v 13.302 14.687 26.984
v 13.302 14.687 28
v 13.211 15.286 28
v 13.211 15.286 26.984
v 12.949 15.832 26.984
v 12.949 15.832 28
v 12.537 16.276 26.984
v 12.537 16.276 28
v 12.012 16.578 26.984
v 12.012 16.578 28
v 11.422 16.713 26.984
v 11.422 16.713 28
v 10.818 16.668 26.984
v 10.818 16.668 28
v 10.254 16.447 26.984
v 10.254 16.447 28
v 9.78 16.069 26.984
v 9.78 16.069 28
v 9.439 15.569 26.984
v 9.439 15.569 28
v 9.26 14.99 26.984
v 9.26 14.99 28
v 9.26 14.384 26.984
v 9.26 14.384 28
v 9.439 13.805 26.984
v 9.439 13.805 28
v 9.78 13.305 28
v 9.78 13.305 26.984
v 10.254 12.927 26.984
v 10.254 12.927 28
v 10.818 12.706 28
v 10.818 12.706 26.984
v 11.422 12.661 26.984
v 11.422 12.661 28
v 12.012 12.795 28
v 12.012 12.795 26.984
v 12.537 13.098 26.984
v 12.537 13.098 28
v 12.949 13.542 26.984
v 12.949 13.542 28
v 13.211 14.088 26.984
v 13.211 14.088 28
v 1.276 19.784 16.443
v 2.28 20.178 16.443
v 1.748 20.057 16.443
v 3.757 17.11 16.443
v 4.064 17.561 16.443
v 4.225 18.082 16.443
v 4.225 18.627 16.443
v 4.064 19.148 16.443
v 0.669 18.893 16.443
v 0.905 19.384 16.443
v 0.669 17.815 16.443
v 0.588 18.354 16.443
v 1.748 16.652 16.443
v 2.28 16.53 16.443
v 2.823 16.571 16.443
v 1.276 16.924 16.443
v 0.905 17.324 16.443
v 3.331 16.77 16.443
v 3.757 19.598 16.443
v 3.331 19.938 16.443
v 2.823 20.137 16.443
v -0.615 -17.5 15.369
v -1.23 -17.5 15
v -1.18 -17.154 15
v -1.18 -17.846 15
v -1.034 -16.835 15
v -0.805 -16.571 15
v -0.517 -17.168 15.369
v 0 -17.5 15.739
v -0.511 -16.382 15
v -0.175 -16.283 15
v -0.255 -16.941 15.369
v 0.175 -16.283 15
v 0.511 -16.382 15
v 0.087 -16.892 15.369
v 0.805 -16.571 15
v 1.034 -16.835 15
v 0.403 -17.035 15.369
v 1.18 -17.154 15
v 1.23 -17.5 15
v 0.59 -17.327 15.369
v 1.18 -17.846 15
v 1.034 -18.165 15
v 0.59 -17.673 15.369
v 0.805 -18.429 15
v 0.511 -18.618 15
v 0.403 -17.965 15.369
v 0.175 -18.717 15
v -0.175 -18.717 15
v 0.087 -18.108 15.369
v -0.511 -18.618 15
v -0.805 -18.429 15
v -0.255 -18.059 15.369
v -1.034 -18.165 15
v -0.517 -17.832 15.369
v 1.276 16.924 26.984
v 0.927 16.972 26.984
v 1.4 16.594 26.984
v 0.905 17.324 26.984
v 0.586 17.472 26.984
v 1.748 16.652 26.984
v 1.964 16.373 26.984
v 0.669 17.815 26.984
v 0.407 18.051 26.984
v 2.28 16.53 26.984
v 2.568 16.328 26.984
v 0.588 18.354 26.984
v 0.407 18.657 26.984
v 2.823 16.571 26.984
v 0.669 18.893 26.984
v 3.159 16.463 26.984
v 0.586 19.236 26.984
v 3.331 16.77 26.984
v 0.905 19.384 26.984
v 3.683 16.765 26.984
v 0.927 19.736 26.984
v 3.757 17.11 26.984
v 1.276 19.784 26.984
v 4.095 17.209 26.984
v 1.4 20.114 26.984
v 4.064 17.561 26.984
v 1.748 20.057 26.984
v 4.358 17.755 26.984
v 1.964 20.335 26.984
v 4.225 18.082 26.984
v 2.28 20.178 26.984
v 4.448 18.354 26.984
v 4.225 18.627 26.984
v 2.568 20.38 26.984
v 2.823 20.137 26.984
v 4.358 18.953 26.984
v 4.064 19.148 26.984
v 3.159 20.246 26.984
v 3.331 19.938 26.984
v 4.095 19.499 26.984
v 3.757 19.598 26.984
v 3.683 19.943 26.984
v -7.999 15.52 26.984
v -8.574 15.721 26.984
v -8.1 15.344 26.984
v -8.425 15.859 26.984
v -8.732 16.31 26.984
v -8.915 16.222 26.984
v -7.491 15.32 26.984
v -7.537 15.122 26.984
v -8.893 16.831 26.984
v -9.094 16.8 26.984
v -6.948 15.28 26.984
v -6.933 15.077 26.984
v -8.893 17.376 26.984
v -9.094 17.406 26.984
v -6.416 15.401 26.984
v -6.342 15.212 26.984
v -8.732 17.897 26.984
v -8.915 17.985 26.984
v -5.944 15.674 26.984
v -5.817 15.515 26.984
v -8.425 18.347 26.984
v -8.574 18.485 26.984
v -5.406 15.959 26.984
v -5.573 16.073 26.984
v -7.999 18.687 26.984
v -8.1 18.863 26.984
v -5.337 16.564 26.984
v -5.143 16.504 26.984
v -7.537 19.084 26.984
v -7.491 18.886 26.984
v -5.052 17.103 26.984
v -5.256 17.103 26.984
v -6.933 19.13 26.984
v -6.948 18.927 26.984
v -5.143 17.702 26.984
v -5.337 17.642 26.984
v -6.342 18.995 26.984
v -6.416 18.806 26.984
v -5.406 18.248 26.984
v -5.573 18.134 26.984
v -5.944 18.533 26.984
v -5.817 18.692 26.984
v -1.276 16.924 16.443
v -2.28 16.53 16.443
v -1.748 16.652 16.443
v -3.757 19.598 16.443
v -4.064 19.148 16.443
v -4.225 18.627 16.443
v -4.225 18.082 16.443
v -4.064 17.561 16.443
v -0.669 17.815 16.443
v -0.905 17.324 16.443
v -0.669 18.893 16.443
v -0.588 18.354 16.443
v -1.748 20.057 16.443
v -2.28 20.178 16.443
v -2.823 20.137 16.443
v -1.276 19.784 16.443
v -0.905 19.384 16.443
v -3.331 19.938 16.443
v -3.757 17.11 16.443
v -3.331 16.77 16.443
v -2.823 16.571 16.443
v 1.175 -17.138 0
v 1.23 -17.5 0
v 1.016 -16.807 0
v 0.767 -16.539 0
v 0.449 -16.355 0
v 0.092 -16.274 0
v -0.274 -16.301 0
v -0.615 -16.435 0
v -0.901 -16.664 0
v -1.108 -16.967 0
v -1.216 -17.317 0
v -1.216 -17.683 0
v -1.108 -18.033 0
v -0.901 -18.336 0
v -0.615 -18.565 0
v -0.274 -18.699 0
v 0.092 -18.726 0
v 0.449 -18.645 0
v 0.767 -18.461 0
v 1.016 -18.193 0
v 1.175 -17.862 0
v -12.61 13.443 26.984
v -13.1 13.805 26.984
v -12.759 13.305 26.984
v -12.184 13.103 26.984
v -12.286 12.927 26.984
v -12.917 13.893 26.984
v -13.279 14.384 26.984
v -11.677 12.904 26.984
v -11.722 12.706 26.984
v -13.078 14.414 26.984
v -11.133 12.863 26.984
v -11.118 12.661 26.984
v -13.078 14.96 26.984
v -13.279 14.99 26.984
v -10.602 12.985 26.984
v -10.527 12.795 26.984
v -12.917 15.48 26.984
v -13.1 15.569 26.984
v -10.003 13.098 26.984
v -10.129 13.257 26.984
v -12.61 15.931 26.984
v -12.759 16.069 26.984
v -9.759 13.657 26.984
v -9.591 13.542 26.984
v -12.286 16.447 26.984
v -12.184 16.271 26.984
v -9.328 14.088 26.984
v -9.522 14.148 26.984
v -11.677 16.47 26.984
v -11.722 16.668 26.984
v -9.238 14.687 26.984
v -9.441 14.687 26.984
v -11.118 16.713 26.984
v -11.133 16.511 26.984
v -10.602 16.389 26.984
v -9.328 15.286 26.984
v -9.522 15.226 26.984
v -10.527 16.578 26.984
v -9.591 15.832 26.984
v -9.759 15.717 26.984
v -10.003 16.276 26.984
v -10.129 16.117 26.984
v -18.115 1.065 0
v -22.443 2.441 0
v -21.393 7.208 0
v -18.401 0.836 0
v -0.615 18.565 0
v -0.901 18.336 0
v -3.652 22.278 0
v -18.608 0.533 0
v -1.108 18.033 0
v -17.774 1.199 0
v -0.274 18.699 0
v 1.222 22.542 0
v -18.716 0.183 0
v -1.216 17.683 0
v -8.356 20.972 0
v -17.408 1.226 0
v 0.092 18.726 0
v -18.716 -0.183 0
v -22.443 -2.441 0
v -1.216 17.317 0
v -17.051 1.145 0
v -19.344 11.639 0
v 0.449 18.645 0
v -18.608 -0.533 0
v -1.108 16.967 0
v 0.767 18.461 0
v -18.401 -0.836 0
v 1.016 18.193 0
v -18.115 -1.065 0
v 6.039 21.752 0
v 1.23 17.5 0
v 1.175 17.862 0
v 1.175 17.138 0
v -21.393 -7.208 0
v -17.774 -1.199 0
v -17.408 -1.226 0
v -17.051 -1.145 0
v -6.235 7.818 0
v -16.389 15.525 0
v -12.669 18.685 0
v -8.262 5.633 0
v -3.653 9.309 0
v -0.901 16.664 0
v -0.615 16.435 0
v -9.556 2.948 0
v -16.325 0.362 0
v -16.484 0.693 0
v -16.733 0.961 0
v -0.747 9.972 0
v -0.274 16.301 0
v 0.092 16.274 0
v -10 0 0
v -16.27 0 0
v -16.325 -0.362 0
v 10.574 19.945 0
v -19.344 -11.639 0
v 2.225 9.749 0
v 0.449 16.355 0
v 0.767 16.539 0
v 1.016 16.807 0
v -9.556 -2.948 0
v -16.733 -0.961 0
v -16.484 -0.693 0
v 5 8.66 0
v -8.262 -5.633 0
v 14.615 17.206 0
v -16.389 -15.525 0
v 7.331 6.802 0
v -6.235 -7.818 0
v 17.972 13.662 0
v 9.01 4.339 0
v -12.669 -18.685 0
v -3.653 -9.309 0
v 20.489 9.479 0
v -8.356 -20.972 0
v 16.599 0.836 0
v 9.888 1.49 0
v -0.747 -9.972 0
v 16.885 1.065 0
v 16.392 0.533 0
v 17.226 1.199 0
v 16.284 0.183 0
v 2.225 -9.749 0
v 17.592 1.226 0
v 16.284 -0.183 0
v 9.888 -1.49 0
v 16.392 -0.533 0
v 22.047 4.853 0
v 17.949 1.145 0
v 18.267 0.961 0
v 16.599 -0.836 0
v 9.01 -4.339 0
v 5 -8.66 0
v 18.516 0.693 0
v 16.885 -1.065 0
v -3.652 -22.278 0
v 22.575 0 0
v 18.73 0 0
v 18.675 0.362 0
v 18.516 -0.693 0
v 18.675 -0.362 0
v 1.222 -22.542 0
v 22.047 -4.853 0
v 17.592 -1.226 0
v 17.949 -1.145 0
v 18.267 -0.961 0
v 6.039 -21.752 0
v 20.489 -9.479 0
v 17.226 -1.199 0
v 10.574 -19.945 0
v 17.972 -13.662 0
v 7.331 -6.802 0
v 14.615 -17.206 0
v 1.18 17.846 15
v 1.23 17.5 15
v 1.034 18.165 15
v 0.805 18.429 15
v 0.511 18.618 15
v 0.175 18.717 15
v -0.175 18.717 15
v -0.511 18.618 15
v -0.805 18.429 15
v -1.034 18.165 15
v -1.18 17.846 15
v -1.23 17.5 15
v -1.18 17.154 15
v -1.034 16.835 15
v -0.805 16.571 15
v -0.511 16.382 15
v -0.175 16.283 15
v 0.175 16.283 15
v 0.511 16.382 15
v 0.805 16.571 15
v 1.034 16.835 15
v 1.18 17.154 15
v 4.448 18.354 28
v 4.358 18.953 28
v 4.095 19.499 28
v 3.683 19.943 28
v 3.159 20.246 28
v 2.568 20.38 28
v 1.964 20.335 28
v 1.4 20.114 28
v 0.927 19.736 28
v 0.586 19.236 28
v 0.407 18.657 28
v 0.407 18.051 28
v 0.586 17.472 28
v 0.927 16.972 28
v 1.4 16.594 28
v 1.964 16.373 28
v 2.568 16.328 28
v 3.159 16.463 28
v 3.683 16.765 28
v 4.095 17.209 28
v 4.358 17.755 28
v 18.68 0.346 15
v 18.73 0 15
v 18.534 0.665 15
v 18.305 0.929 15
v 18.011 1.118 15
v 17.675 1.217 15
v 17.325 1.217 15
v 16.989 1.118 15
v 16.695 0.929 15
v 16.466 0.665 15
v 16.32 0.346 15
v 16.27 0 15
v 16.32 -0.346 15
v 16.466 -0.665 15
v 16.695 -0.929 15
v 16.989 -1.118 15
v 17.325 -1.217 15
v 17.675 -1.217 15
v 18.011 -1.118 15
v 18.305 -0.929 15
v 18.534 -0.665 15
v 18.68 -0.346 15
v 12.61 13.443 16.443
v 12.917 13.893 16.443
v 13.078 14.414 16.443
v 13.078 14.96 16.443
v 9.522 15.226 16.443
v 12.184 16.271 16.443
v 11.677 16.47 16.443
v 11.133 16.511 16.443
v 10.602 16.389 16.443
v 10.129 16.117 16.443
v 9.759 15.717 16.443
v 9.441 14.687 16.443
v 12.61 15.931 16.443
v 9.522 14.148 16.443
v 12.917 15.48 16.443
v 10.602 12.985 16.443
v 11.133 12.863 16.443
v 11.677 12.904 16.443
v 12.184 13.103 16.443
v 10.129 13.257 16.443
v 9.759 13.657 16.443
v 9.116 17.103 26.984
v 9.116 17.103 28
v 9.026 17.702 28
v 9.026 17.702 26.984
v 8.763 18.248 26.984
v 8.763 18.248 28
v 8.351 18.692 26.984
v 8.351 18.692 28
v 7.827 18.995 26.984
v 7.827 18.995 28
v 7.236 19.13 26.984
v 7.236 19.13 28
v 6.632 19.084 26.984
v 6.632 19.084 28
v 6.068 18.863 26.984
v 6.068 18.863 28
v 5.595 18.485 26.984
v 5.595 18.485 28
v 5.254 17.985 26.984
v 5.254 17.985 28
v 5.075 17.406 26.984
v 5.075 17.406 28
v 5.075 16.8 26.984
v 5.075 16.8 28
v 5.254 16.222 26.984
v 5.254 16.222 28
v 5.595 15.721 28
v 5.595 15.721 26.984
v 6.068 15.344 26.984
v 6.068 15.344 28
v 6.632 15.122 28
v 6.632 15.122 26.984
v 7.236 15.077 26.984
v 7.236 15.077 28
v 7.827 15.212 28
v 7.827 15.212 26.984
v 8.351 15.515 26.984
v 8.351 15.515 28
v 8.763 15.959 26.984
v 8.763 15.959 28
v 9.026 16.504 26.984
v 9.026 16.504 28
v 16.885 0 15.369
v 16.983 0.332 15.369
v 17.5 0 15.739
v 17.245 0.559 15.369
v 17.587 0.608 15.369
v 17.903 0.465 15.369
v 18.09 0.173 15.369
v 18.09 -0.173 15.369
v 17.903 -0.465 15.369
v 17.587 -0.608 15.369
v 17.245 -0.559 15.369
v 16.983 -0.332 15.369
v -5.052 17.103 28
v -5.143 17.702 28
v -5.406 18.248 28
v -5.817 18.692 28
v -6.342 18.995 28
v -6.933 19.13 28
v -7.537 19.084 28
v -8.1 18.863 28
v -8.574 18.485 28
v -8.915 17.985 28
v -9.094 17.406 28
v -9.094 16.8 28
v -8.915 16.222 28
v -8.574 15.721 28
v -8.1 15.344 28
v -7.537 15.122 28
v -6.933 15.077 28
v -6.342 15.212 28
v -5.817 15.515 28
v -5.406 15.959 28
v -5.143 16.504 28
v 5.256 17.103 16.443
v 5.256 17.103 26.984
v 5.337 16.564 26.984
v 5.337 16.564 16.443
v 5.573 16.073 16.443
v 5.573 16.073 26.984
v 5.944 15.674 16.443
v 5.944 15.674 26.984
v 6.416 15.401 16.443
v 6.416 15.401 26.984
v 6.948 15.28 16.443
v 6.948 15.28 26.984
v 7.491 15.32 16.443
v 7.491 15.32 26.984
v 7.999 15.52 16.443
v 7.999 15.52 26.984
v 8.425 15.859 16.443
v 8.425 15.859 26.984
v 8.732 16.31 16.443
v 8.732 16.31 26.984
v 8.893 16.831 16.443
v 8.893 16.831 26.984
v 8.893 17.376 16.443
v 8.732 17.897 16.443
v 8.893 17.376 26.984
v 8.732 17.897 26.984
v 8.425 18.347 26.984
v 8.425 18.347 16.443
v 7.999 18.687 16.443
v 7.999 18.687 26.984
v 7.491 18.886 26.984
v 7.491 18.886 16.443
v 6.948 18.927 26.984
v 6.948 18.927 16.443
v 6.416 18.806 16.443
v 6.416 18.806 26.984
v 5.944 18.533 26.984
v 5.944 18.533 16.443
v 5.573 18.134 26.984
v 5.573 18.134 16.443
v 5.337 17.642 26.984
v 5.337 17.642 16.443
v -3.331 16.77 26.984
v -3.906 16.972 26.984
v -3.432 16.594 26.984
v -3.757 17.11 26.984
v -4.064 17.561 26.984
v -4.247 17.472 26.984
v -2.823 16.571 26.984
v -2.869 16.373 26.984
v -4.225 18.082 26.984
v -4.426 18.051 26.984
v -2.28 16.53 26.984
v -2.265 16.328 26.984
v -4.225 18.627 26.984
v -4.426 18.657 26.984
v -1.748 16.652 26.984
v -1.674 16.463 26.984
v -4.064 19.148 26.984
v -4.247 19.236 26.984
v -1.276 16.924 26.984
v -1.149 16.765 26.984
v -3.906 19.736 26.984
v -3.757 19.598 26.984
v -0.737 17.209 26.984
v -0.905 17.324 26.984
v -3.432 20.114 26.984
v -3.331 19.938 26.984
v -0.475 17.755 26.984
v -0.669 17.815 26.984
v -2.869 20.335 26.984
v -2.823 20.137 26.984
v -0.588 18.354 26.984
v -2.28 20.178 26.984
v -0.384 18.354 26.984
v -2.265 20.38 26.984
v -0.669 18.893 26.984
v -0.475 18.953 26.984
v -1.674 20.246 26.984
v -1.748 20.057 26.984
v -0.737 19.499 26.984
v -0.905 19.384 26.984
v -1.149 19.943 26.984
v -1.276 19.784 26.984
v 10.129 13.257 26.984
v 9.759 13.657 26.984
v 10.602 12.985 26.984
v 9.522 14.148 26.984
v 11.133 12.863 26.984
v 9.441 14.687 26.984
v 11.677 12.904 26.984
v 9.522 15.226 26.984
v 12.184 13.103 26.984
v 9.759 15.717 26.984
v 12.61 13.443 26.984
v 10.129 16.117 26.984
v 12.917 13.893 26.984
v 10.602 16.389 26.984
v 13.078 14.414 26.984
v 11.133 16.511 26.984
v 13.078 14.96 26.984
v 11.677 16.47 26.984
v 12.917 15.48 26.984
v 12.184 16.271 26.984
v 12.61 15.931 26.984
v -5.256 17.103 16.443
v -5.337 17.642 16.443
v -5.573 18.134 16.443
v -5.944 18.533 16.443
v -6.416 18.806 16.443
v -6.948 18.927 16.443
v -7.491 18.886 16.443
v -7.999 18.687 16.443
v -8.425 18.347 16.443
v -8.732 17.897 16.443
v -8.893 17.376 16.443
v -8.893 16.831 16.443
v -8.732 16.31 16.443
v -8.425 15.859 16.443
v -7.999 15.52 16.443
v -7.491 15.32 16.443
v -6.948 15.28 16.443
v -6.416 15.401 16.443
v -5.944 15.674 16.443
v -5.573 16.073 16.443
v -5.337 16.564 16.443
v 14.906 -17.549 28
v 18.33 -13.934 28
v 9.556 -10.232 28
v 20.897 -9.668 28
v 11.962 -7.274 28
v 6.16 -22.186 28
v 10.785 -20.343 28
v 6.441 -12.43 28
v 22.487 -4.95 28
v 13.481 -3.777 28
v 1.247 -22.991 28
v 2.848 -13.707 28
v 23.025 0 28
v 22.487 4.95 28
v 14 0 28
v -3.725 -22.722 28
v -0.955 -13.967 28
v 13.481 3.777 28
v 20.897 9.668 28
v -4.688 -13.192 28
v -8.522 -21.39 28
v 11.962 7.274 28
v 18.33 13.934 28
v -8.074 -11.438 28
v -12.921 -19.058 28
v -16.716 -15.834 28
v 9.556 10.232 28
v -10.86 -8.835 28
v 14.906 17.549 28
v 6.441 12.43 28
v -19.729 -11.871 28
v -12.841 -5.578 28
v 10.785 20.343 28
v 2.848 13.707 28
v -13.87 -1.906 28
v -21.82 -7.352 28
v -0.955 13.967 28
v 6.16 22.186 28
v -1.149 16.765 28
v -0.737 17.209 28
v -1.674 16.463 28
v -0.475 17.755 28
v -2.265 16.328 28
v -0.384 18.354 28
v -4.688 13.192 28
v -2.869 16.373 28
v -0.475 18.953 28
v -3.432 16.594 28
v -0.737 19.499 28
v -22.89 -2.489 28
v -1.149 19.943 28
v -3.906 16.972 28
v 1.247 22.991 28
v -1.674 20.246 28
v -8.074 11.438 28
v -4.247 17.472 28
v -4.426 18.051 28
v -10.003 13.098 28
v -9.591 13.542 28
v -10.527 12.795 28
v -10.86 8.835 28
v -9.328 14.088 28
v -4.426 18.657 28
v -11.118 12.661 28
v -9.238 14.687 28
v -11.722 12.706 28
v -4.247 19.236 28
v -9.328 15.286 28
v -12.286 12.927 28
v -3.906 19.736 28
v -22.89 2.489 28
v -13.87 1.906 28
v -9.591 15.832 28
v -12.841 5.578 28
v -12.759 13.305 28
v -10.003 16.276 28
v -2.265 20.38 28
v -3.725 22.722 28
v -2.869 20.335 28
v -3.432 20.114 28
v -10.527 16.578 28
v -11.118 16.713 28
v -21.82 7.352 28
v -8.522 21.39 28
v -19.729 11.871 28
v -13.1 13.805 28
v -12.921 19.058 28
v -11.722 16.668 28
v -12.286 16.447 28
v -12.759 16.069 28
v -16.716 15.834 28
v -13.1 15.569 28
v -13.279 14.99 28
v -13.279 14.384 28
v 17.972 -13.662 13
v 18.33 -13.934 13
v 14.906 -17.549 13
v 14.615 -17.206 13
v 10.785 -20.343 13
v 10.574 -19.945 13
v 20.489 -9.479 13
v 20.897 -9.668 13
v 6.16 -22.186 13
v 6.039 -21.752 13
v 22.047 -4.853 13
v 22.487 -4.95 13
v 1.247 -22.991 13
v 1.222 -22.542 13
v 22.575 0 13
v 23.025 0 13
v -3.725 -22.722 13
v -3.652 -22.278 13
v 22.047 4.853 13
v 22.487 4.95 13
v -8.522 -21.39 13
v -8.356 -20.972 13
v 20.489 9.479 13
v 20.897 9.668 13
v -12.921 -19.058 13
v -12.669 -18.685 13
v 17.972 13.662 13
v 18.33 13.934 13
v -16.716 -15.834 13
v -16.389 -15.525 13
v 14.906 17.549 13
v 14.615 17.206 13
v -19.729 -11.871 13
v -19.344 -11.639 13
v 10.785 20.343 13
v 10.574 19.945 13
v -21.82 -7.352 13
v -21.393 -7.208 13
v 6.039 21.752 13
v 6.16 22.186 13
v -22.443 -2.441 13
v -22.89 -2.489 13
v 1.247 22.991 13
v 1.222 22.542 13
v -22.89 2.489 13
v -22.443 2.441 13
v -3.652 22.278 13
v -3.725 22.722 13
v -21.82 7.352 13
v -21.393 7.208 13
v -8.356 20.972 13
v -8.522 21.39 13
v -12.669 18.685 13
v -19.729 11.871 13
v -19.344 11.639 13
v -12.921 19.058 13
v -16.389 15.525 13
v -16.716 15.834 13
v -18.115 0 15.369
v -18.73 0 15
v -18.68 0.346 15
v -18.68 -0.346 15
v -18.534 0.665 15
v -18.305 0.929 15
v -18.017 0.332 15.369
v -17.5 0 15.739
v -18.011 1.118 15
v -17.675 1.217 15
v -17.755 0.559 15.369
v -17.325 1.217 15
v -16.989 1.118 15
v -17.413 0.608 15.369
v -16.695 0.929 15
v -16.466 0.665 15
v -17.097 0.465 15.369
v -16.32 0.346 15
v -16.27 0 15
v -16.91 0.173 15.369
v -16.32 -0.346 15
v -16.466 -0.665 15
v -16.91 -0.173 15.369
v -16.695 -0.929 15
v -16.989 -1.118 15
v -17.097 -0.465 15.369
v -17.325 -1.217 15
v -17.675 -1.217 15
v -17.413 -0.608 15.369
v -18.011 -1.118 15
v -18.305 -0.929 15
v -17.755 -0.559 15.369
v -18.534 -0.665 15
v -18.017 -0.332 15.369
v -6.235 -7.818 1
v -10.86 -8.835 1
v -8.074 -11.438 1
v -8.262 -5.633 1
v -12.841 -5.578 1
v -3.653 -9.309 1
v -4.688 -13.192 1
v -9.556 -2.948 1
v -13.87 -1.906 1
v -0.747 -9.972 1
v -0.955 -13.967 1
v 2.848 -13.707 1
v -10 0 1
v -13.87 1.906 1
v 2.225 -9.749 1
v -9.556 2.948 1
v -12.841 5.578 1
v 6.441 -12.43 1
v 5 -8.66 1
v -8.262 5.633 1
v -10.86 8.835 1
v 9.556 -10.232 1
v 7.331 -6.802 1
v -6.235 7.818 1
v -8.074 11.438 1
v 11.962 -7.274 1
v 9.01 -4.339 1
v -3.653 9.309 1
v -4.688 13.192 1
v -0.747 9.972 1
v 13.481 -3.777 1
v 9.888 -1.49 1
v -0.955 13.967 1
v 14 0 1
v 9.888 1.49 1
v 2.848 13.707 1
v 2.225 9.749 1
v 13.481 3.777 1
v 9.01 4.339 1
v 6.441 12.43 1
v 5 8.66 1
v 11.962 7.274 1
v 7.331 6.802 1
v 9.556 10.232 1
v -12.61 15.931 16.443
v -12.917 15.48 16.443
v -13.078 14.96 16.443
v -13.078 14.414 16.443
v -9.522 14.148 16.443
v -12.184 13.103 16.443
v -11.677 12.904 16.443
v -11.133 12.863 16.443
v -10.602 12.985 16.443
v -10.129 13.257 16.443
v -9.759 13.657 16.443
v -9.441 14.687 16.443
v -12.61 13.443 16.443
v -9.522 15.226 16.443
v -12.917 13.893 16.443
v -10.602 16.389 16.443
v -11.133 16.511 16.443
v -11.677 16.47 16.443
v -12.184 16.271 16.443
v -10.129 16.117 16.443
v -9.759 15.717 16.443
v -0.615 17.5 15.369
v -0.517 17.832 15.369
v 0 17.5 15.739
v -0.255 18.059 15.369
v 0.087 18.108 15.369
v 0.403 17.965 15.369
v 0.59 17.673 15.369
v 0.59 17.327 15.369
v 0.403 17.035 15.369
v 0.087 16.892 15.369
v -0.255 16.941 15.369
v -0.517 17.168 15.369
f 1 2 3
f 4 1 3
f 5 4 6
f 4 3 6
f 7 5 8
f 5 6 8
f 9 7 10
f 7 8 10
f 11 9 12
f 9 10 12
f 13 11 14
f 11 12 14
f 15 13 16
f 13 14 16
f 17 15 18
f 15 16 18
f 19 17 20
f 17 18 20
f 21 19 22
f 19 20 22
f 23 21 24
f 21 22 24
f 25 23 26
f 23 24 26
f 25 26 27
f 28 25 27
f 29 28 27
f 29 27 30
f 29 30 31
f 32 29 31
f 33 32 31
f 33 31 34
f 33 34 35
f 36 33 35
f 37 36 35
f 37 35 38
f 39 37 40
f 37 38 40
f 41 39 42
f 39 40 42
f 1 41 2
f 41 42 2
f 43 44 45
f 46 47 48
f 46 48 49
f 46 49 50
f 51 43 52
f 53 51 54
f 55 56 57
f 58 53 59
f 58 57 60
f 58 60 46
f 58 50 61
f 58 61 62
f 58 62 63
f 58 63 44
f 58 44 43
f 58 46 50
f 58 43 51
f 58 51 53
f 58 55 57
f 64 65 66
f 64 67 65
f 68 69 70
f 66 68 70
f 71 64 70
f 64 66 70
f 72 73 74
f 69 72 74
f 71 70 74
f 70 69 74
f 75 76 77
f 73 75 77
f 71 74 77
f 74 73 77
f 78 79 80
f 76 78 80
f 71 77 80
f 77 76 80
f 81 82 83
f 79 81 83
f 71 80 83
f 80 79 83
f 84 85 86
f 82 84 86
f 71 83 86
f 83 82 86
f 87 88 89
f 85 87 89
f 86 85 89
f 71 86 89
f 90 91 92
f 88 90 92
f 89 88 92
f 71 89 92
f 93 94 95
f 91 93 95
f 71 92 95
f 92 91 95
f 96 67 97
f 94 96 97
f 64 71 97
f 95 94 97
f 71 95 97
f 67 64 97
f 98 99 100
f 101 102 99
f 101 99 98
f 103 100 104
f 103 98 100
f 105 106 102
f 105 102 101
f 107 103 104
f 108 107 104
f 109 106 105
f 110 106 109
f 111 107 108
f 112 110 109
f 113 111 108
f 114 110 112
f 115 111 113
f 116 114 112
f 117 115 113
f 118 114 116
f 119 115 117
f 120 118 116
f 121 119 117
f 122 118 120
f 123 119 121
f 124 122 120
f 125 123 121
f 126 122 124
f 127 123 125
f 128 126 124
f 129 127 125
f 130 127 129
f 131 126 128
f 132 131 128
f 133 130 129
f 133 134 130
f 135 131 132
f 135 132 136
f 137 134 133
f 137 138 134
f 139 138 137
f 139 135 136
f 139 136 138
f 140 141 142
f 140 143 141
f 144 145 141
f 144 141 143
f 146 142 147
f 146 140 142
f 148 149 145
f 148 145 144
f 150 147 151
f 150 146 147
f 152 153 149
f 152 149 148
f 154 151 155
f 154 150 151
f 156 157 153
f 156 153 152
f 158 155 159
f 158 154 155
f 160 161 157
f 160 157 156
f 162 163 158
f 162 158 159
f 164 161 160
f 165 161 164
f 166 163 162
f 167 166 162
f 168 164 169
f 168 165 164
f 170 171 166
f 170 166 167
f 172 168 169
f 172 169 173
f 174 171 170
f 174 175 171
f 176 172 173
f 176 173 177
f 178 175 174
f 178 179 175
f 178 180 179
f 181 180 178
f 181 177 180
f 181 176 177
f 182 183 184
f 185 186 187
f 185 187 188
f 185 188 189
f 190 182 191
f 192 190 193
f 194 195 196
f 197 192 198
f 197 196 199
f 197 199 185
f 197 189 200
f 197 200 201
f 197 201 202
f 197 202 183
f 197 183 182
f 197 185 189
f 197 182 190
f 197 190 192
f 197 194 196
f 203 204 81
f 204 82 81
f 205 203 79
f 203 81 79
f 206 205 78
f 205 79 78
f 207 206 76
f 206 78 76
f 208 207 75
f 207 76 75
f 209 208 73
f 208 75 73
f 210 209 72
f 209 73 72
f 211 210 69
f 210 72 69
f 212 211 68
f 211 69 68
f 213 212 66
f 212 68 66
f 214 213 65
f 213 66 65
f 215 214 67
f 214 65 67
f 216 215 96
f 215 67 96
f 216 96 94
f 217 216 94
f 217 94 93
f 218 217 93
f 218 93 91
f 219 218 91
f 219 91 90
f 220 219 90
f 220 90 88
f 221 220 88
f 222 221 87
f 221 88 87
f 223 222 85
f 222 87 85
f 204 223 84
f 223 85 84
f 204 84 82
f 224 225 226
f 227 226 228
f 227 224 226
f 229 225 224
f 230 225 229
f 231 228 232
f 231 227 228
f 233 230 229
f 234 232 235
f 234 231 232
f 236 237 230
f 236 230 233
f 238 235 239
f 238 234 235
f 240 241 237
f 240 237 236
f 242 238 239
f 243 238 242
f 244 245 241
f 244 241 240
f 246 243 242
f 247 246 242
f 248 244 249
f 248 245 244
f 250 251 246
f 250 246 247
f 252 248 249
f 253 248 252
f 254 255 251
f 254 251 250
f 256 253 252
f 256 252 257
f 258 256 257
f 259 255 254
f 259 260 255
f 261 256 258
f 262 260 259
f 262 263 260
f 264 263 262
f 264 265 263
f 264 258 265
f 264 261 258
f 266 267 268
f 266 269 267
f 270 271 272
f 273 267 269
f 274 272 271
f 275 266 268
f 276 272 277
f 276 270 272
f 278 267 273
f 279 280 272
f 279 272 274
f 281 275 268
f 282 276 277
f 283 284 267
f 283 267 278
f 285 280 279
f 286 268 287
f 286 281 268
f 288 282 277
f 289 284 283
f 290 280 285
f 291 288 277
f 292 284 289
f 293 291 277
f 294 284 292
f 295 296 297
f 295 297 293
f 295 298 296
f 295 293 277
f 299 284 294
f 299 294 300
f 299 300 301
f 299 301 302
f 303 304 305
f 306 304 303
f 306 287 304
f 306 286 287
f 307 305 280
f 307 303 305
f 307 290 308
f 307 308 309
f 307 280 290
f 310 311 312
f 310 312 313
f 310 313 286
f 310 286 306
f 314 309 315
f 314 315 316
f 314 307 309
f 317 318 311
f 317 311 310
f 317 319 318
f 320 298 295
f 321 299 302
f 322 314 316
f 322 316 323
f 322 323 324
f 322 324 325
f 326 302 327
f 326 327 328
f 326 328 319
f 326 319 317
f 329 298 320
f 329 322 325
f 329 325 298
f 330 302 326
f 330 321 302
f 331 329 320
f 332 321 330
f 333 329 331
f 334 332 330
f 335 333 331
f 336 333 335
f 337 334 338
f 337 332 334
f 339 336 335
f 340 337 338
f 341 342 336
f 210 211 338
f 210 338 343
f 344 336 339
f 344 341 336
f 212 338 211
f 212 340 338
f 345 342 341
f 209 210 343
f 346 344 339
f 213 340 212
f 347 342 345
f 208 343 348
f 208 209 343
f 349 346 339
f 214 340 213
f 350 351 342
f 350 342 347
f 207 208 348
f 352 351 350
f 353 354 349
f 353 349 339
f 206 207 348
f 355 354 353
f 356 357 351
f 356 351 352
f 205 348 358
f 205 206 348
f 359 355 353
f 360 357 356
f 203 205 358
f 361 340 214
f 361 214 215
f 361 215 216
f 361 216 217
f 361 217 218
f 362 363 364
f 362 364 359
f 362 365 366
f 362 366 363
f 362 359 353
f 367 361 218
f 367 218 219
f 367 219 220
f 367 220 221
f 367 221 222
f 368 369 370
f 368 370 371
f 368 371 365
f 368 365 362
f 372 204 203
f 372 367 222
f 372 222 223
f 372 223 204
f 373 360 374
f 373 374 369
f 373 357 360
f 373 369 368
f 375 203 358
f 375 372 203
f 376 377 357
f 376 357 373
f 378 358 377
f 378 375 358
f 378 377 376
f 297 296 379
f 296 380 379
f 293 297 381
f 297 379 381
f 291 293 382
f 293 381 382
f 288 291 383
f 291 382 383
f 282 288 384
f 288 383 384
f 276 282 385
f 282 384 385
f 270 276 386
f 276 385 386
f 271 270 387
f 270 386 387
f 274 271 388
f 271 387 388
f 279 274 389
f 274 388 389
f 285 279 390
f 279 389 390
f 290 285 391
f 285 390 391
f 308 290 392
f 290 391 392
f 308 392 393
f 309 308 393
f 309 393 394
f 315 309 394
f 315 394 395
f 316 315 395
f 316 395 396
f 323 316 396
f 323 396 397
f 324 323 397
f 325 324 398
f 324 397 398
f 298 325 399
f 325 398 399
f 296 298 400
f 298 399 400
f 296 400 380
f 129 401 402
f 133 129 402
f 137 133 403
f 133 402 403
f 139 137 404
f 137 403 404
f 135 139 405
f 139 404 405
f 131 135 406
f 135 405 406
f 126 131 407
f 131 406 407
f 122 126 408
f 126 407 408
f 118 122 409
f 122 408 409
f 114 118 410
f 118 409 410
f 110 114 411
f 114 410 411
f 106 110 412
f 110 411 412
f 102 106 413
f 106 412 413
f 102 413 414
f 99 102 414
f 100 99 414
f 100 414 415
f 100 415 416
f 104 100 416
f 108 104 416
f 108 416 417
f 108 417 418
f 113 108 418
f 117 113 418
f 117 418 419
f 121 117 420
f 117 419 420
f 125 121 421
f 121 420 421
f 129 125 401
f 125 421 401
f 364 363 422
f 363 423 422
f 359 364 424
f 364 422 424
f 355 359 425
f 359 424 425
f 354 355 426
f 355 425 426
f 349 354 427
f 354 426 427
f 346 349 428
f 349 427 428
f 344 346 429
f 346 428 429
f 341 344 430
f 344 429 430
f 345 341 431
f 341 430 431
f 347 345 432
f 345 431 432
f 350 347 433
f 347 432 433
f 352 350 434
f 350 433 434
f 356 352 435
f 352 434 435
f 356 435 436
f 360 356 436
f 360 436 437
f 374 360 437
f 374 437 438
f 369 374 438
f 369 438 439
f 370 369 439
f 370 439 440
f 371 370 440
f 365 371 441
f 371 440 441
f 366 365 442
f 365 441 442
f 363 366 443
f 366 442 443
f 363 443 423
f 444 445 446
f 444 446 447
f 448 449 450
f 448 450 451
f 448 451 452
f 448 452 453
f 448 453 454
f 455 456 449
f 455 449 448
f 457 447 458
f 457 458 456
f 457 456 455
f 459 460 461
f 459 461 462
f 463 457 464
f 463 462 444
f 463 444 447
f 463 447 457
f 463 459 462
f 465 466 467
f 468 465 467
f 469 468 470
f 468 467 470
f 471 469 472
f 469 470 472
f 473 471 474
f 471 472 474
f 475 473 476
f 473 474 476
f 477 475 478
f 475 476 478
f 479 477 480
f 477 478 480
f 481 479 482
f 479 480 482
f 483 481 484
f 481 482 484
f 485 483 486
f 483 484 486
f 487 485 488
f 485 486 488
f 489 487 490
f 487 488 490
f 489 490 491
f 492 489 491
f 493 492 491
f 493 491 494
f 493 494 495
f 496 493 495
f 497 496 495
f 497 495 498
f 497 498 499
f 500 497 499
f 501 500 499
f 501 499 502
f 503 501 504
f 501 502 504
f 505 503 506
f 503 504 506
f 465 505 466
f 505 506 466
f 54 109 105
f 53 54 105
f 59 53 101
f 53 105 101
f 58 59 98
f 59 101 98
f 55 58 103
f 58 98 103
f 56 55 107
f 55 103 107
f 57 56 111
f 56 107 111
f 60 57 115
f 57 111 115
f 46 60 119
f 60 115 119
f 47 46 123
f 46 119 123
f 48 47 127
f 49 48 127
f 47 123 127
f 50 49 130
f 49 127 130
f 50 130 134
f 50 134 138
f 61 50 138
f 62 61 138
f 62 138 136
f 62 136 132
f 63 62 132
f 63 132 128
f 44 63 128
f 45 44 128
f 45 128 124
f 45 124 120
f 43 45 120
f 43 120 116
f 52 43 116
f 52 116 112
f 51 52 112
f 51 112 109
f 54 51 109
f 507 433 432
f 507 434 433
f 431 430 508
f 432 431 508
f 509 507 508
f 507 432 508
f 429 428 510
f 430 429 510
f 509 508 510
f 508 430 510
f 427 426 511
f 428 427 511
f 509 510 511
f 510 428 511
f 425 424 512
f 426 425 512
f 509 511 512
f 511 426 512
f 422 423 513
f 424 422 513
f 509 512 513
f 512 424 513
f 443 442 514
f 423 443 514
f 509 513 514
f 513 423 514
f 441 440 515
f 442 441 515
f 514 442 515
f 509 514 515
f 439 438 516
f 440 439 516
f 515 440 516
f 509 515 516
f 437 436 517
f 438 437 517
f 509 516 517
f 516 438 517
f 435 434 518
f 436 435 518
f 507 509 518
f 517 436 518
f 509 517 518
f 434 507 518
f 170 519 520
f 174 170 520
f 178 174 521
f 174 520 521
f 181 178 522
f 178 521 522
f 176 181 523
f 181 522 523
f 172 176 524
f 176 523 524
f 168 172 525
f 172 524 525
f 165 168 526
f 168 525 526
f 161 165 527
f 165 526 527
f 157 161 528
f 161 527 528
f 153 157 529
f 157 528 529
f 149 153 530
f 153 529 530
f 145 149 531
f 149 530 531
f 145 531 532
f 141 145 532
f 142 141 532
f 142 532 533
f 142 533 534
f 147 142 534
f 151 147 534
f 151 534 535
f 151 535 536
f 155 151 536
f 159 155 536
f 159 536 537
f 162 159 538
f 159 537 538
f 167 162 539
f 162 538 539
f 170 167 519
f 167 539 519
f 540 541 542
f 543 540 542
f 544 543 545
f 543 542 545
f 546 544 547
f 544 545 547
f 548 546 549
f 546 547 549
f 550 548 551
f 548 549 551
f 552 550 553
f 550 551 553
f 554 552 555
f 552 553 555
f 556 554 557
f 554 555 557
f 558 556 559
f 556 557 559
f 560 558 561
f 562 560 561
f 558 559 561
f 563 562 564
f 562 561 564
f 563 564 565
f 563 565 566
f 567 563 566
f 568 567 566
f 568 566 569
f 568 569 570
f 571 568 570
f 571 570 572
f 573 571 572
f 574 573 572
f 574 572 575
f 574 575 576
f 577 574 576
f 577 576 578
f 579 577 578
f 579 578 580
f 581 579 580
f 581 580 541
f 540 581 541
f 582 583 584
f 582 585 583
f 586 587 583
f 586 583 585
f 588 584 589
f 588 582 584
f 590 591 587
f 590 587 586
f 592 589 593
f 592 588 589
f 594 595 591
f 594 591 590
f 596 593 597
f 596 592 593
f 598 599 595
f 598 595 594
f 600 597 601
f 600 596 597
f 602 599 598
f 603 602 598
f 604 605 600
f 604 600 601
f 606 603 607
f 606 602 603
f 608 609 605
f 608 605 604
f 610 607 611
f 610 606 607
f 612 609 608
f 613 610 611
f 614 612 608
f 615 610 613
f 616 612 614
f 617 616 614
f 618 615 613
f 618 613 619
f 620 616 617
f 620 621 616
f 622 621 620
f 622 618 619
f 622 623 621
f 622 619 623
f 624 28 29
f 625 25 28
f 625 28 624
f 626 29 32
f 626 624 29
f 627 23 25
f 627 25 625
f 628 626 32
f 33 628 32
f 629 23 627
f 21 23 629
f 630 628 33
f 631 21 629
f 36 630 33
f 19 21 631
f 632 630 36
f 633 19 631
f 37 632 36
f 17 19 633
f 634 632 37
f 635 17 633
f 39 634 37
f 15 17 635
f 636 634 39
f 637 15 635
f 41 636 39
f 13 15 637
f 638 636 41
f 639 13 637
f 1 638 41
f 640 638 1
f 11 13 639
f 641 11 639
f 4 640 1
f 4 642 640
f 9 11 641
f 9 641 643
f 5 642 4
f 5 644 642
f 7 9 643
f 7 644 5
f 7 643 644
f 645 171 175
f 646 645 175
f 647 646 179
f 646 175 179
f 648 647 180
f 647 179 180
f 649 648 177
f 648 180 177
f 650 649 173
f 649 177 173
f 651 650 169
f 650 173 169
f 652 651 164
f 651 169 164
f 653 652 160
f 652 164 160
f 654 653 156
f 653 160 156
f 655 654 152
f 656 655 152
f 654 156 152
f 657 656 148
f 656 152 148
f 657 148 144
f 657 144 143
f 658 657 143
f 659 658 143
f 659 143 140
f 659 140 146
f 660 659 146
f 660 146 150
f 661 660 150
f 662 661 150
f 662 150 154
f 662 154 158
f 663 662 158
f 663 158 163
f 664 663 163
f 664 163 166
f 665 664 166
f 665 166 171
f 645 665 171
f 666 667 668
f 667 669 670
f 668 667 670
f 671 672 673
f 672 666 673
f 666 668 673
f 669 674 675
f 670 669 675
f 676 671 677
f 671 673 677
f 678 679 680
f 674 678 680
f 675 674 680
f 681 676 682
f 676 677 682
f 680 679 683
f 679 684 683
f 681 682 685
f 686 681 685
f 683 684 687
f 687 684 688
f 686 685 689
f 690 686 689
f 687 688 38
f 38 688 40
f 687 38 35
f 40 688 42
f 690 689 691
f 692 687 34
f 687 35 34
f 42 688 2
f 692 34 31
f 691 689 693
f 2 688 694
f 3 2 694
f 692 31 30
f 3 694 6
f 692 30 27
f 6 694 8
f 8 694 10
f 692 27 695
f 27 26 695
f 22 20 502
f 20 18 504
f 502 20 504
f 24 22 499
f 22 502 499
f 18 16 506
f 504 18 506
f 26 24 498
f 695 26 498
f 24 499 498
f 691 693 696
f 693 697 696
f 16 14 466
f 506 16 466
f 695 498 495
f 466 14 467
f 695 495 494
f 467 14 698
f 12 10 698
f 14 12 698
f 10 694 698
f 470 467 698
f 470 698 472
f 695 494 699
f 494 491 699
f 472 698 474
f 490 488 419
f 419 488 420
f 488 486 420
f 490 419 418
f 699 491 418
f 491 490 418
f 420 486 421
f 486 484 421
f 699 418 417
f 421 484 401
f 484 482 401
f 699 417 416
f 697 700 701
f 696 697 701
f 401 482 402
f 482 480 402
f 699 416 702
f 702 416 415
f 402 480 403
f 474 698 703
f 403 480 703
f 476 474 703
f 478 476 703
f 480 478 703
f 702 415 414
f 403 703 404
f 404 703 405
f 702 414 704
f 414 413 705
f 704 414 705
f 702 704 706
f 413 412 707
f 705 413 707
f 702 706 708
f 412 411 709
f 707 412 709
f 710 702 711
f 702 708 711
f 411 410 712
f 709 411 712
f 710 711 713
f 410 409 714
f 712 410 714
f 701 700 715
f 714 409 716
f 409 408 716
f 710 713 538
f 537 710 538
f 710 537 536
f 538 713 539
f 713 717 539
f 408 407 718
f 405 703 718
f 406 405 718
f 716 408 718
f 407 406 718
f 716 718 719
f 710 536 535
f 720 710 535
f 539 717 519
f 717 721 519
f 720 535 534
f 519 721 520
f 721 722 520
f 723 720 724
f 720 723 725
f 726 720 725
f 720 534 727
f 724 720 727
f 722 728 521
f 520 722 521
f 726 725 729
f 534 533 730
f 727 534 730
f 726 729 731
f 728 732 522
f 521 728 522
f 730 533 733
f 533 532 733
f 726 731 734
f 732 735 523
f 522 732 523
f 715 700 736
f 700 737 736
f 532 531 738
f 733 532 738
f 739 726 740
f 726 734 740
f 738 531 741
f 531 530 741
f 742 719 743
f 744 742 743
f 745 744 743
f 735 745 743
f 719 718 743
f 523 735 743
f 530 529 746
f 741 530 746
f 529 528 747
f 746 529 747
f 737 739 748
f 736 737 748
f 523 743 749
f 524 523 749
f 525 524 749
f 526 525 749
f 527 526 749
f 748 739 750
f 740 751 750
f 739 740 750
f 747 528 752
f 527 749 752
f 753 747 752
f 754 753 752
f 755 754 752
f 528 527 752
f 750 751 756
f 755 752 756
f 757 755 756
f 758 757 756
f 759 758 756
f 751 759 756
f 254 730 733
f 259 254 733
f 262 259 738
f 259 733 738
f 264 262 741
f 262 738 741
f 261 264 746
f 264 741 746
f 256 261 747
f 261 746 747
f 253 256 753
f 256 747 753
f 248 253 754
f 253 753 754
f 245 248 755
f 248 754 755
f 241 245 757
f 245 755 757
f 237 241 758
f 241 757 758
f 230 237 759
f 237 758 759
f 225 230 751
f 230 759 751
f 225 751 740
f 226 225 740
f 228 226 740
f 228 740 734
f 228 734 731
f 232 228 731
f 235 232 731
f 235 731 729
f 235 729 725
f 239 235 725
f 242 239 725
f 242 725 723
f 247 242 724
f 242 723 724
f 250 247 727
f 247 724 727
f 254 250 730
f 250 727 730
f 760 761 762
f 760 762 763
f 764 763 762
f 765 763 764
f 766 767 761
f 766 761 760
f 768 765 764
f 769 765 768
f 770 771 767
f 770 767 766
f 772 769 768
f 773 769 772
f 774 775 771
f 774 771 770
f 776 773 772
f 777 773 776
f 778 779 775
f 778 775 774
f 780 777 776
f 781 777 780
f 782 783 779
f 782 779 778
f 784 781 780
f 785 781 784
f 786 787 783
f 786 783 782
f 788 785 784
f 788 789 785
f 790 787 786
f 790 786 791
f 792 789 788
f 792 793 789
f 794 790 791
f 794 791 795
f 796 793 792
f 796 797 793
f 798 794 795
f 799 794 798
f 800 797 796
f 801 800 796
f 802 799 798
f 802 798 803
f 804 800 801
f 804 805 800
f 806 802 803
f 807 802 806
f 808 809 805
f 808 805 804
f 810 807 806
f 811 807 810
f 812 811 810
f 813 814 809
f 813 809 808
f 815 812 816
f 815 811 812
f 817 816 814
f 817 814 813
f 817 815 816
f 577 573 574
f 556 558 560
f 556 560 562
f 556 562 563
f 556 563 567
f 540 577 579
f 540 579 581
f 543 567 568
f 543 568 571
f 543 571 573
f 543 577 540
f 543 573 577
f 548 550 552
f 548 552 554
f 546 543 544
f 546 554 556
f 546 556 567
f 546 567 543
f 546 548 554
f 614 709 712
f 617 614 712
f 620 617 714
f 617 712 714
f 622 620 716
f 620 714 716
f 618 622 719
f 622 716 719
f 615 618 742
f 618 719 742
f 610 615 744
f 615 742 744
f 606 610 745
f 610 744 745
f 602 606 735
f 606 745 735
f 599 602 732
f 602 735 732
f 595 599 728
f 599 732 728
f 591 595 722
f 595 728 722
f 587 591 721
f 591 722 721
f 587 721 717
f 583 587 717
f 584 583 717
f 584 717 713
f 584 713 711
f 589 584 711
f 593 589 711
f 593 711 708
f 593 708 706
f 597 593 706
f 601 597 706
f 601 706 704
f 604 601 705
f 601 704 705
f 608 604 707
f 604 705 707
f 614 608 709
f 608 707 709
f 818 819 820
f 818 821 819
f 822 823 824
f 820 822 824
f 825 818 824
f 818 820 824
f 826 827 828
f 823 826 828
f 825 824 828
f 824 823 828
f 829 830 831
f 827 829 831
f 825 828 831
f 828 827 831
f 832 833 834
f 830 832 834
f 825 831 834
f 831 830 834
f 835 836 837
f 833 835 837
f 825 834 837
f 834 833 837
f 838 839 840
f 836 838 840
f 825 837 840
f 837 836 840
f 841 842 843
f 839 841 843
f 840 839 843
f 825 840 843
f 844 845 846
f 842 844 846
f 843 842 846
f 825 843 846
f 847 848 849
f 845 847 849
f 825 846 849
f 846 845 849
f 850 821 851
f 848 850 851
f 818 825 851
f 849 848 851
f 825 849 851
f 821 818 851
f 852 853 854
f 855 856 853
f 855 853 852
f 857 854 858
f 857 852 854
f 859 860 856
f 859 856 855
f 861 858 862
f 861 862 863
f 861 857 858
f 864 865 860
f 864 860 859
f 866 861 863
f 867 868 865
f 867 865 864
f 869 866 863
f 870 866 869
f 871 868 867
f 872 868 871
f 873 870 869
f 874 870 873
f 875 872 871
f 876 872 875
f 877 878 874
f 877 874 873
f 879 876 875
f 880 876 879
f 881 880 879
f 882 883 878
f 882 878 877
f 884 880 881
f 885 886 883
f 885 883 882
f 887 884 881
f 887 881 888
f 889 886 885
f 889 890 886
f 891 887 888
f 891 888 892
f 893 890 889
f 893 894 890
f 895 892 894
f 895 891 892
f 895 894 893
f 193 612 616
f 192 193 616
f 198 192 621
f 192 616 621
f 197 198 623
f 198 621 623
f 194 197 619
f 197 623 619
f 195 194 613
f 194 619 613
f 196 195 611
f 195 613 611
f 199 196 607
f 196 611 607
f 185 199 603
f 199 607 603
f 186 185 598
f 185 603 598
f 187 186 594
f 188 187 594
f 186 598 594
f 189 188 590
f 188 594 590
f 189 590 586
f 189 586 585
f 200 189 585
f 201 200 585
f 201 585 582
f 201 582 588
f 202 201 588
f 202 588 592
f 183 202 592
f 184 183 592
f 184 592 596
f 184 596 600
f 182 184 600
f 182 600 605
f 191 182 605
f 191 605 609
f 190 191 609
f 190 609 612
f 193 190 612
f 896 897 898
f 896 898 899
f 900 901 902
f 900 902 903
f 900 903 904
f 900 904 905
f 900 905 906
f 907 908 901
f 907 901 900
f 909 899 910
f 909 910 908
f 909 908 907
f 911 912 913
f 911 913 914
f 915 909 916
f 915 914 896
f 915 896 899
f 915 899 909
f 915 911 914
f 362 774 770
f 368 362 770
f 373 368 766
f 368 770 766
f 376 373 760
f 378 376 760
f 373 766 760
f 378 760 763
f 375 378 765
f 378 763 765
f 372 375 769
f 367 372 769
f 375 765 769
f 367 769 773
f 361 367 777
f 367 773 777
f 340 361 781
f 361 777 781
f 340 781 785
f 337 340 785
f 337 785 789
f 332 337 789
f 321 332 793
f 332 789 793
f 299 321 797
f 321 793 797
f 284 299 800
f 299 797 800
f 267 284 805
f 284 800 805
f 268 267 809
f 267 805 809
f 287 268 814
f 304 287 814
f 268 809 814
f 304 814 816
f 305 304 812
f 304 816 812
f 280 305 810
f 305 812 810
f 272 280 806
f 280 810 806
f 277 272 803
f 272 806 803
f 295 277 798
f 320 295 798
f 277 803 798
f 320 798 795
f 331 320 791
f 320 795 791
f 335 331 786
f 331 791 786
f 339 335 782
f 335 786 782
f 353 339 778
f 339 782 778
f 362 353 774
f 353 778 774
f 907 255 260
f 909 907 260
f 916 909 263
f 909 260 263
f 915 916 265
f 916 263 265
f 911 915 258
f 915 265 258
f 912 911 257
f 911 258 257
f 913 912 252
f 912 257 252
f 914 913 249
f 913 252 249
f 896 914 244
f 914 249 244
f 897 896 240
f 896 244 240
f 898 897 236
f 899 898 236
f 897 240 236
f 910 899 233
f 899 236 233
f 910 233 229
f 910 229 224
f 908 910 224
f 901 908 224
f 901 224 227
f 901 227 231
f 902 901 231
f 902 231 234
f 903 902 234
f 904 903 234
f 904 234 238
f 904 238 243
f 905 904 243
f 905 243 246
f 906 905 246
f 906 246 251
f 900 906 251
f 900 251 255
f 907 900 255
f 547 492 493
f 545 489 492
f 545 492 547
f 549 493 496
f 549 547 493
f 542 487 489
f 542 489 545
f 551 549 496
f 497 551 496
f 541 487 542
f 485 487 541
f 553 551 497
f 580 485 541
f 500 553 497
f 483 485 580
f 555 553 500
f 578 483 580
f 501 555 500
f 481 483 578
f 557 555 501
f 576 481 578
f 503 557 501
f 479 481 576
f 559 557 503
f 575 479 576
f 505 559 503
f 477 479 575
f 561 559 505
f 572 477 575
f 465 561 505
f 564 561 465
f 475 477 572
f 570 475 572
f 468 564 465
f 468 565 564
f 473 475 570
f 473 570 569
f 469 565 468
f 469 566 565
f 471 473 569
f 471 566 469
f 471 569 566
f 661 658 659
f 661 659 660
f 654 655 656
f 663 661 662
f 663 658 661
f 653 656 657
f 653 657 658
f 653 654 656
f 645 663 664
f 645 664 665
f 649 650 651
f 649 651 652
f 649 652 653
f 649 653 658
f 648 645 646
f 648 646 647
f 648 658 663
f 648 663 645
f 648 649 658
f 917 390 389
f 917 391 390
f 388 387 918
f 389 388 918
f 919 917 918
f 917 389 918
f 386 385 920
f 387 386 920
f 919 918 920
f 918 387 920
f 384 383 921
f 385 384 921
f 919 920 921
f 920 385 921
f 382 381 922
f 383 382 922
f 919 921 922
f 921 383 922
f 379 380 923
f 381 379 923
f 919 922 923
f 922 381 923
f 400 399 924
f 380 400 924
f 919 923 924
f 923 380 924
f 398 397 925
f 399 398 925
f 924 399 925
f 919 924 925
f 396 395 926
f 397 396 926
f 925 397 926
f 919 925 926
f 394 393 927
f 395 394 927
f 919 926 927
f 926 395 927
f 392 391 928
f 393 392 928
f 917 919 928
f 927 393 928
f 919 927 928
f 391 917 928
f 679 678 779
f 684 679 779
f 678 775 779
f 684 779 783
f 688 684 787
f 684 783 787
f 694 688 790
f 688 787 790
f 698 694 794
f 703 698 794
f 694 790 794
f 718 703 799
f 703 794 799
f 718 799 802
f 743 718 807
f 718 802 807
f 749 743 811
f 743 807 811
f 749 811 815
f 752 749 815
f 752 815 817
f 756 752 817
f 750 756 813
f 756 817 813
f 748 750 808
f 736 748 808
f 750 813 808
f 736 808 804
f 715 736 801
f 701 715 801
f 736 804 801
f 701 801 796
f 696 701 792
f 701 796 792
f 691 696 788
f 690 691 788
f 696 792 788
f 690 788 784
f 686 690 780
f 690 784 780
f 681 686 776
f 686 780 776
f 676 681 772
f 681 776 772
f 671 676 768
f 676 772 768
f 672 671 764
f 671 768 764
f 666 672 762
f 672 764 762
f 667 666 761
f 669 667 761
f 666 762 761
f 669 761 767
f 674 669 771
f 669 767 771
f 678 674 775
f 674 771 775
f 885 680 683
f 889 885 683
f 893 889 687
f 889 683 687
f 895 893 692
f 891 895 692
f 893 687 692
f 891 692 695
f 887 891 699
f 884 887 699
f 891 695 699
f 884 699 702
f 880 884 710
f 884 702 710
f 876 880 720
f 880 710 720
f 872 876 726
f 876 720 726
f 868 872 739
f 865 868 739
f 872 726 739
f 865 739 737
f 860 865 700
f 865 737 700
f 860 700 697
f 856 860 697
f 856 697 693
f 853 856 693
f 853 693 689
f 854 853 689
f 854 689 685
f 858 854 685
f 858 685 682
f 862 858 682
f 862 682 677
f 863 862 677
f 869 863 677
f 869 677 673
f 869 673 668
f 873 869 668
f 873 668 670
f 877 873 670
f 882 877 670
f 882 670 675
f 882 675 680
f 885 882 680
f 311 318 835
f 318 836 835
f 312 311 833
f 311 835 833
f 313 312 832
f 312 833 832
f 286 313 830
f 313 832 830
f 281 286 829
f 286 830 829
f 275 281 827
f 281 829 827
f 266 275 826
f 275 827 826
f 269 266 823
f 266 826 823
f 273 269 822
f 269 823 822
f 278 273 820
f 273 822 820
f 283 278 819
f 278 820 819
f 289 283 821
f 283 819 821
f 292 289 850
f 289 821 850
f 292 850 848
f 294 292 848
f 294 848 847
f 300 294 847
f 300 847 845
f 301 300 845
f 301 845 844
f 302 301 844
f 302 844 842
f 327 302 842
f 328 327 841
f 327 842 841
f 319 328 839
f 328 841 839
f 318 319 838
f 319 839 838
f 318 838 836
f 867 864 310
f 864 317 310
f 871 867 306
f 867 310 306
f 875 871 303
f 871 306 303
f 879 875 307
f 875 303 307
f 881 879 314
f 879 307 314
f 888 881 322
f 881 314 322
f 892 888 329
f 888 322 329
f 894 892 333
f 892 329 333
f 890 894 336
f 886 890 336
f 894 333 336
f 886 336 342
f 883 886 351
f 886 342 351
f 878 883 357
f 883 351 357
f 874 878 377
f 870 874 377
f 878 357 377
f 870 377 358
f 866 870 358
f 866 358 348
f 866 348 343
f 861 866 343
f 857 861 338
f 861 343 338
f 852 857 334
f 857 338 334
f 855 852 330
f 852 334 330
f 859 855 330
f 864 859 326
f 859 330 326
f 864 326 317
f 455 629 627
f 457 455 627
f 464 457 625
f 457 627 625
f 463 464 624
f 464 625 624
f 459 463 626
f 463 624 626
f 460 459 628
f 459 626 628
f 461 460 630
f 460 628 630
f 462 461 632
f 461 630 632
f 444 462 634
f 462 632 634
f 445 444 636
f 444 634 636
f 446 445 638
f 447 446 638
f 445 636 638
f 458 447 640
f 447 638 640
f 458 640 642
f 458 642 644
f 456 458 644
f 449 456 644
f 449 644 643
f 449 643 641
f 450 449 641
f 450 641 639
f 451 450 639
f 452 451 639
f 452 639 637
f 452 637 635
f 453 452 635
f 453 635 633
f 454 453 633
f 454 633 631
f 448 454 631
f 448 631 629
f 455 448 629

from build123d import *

# Parameters (mm, degrees)
SKETCH1_W                = 23.025
SKETCH1_H                = 15
SKETCH2_R                = 22.575
BOSS_EXTRUDE1_DEPTH      = 13
HOLE1_D                  = 20
HOLE1_CBORE_D            = 28
HOLE1_CBORE_DEPTH        = 27
M2_CLEARANCE_HOLE1_D     = 2.459
M2_CLEARANCE_HOLE1_DEPTH = 14.999999999
M2_CLEARANCE_HOLE1_TIP   = 0.738758131
SKETCH7_R                = 1.8288
CUT_EXTRUDE1_DEPTH       = 11.557
SKETCH8_R                = 2.032
CUT_EXTRUDE2_DEPTH       = 1.016


with BuildPart() as part:
    # Sketch1 → Revolve1 (revolve)
    with BuildSketch(Plane(origin=(0, 0, 0), x_dir=(1, 0, 0), z_dir=(0, 1, 0))):
        with Locations((11.5125, -20.5)):
            Rectangle(SKETCH1_W, SKETCH1_H)
    revolve(axis=Axis((0, 0, 13), (0, 0, 1)))

    # Sketch2 → Boss-Extrude1 (add)
    with BuildSketch(Plane(origin=(0, 0, 13), x_dir=(-1, 0, 0), z_dir=(0, 0, -1))):
        with Locations(Location((0, 0, 0), (0, 0, 180))):
            Circle(SKETCH2_R)
    extrude(amount=BOSS_EXTRUDE1_DEPTH)

    # Hole1 (through all)
    with Locations(Plane.XY.offset(28)):
        with Locations((0, 0)):
            CounterBoreHole(HOLE1_D / 2, HOLE1_CBORE_D / 2, HOLE1_CBORE_DEPTH)

    # M2 Clearance Hole1
    with Locations(Plane(origin=(0, 0, 0), x_dir=(-1, 0, 0), z_dir=(0, 0, -1))):
        with Locations((0, 17.5), (-17.5, 0), (0, -17.5), (17.5, 0)):
            Hole(M2_CLEARANCE_HOLE1_D / 2, depth=M2_CLEARANCE_HOLE1_DEPTH)
            with Locations((0, 0, -(M2_CLEARANCE_HOLE1_DEPTH + M2_CLEARANCE_HOLE1_TIP / 2))):  # 118° drill point
                Cone(0, M2_CLEARANCE_HOLE1_D / 2, M2_CLEARANCE_HOLE1_TIP, mode=Mode.SUBTRACT)

    # Sketch7 → Cut-Extrude1 (cut)
    with BuildSketch(Plane.XY.offset(28)):
        with Locations((-2.416366133, 18.354122996)):
            Circle(SKETCH7_R)
        with Locations((-7.084427042, 17.103319846)):
            Circle(SKETCH7_R)
        with Locations((-11.269695955, 14.686953712)):
            Circle(SKETCH7_R)
        with Locations(Location((11.269695955, 14.686953712, 0), (0, 0, 180))):
            Circle(SKETCH7_R)
        with Locations(Location((7.084427042, 17.103319846, 0), (0, 0, 180))):
            Circle(SKETCH7_R)
        with Locations(Location((2.416366133, 18.354122996, 0), (0, 0, 180))):
            Circle(SKETCH7_R)
    extrude(amount=-CUT_EXTRUDE1_DEPTH, mode=Mode.SUBTRACT)

    # Sketch8 → Cut-Extrude2 (cut)
    with BuildSketch(Plane.XY.offset(28)):
        with Locations((-11.269695955, 14.686953712)):
            Circle(SKETCH8_R)
        with Locations((-7.084427042, 17.103319846)):
            Circle(SKETCH8_R)
        with Locations((-2.416366133, 18.354122996)):
            Circle(SKETCH8_R)
        with Locations((2.416366133, 18.354122996)):
            Circle(SKETCH8_R)
        with Locations((7.084427042, 17.103319846)):
            Circle(SKETCH8_R)
        with Locations((11.269695955, 14.686953712)):
            Circle(SKETCH8_R)
    extrude(amount=-CUT_EXTRUDE2_DEPTH, mode=Mode.SUBTRACT)


solid = part.part
